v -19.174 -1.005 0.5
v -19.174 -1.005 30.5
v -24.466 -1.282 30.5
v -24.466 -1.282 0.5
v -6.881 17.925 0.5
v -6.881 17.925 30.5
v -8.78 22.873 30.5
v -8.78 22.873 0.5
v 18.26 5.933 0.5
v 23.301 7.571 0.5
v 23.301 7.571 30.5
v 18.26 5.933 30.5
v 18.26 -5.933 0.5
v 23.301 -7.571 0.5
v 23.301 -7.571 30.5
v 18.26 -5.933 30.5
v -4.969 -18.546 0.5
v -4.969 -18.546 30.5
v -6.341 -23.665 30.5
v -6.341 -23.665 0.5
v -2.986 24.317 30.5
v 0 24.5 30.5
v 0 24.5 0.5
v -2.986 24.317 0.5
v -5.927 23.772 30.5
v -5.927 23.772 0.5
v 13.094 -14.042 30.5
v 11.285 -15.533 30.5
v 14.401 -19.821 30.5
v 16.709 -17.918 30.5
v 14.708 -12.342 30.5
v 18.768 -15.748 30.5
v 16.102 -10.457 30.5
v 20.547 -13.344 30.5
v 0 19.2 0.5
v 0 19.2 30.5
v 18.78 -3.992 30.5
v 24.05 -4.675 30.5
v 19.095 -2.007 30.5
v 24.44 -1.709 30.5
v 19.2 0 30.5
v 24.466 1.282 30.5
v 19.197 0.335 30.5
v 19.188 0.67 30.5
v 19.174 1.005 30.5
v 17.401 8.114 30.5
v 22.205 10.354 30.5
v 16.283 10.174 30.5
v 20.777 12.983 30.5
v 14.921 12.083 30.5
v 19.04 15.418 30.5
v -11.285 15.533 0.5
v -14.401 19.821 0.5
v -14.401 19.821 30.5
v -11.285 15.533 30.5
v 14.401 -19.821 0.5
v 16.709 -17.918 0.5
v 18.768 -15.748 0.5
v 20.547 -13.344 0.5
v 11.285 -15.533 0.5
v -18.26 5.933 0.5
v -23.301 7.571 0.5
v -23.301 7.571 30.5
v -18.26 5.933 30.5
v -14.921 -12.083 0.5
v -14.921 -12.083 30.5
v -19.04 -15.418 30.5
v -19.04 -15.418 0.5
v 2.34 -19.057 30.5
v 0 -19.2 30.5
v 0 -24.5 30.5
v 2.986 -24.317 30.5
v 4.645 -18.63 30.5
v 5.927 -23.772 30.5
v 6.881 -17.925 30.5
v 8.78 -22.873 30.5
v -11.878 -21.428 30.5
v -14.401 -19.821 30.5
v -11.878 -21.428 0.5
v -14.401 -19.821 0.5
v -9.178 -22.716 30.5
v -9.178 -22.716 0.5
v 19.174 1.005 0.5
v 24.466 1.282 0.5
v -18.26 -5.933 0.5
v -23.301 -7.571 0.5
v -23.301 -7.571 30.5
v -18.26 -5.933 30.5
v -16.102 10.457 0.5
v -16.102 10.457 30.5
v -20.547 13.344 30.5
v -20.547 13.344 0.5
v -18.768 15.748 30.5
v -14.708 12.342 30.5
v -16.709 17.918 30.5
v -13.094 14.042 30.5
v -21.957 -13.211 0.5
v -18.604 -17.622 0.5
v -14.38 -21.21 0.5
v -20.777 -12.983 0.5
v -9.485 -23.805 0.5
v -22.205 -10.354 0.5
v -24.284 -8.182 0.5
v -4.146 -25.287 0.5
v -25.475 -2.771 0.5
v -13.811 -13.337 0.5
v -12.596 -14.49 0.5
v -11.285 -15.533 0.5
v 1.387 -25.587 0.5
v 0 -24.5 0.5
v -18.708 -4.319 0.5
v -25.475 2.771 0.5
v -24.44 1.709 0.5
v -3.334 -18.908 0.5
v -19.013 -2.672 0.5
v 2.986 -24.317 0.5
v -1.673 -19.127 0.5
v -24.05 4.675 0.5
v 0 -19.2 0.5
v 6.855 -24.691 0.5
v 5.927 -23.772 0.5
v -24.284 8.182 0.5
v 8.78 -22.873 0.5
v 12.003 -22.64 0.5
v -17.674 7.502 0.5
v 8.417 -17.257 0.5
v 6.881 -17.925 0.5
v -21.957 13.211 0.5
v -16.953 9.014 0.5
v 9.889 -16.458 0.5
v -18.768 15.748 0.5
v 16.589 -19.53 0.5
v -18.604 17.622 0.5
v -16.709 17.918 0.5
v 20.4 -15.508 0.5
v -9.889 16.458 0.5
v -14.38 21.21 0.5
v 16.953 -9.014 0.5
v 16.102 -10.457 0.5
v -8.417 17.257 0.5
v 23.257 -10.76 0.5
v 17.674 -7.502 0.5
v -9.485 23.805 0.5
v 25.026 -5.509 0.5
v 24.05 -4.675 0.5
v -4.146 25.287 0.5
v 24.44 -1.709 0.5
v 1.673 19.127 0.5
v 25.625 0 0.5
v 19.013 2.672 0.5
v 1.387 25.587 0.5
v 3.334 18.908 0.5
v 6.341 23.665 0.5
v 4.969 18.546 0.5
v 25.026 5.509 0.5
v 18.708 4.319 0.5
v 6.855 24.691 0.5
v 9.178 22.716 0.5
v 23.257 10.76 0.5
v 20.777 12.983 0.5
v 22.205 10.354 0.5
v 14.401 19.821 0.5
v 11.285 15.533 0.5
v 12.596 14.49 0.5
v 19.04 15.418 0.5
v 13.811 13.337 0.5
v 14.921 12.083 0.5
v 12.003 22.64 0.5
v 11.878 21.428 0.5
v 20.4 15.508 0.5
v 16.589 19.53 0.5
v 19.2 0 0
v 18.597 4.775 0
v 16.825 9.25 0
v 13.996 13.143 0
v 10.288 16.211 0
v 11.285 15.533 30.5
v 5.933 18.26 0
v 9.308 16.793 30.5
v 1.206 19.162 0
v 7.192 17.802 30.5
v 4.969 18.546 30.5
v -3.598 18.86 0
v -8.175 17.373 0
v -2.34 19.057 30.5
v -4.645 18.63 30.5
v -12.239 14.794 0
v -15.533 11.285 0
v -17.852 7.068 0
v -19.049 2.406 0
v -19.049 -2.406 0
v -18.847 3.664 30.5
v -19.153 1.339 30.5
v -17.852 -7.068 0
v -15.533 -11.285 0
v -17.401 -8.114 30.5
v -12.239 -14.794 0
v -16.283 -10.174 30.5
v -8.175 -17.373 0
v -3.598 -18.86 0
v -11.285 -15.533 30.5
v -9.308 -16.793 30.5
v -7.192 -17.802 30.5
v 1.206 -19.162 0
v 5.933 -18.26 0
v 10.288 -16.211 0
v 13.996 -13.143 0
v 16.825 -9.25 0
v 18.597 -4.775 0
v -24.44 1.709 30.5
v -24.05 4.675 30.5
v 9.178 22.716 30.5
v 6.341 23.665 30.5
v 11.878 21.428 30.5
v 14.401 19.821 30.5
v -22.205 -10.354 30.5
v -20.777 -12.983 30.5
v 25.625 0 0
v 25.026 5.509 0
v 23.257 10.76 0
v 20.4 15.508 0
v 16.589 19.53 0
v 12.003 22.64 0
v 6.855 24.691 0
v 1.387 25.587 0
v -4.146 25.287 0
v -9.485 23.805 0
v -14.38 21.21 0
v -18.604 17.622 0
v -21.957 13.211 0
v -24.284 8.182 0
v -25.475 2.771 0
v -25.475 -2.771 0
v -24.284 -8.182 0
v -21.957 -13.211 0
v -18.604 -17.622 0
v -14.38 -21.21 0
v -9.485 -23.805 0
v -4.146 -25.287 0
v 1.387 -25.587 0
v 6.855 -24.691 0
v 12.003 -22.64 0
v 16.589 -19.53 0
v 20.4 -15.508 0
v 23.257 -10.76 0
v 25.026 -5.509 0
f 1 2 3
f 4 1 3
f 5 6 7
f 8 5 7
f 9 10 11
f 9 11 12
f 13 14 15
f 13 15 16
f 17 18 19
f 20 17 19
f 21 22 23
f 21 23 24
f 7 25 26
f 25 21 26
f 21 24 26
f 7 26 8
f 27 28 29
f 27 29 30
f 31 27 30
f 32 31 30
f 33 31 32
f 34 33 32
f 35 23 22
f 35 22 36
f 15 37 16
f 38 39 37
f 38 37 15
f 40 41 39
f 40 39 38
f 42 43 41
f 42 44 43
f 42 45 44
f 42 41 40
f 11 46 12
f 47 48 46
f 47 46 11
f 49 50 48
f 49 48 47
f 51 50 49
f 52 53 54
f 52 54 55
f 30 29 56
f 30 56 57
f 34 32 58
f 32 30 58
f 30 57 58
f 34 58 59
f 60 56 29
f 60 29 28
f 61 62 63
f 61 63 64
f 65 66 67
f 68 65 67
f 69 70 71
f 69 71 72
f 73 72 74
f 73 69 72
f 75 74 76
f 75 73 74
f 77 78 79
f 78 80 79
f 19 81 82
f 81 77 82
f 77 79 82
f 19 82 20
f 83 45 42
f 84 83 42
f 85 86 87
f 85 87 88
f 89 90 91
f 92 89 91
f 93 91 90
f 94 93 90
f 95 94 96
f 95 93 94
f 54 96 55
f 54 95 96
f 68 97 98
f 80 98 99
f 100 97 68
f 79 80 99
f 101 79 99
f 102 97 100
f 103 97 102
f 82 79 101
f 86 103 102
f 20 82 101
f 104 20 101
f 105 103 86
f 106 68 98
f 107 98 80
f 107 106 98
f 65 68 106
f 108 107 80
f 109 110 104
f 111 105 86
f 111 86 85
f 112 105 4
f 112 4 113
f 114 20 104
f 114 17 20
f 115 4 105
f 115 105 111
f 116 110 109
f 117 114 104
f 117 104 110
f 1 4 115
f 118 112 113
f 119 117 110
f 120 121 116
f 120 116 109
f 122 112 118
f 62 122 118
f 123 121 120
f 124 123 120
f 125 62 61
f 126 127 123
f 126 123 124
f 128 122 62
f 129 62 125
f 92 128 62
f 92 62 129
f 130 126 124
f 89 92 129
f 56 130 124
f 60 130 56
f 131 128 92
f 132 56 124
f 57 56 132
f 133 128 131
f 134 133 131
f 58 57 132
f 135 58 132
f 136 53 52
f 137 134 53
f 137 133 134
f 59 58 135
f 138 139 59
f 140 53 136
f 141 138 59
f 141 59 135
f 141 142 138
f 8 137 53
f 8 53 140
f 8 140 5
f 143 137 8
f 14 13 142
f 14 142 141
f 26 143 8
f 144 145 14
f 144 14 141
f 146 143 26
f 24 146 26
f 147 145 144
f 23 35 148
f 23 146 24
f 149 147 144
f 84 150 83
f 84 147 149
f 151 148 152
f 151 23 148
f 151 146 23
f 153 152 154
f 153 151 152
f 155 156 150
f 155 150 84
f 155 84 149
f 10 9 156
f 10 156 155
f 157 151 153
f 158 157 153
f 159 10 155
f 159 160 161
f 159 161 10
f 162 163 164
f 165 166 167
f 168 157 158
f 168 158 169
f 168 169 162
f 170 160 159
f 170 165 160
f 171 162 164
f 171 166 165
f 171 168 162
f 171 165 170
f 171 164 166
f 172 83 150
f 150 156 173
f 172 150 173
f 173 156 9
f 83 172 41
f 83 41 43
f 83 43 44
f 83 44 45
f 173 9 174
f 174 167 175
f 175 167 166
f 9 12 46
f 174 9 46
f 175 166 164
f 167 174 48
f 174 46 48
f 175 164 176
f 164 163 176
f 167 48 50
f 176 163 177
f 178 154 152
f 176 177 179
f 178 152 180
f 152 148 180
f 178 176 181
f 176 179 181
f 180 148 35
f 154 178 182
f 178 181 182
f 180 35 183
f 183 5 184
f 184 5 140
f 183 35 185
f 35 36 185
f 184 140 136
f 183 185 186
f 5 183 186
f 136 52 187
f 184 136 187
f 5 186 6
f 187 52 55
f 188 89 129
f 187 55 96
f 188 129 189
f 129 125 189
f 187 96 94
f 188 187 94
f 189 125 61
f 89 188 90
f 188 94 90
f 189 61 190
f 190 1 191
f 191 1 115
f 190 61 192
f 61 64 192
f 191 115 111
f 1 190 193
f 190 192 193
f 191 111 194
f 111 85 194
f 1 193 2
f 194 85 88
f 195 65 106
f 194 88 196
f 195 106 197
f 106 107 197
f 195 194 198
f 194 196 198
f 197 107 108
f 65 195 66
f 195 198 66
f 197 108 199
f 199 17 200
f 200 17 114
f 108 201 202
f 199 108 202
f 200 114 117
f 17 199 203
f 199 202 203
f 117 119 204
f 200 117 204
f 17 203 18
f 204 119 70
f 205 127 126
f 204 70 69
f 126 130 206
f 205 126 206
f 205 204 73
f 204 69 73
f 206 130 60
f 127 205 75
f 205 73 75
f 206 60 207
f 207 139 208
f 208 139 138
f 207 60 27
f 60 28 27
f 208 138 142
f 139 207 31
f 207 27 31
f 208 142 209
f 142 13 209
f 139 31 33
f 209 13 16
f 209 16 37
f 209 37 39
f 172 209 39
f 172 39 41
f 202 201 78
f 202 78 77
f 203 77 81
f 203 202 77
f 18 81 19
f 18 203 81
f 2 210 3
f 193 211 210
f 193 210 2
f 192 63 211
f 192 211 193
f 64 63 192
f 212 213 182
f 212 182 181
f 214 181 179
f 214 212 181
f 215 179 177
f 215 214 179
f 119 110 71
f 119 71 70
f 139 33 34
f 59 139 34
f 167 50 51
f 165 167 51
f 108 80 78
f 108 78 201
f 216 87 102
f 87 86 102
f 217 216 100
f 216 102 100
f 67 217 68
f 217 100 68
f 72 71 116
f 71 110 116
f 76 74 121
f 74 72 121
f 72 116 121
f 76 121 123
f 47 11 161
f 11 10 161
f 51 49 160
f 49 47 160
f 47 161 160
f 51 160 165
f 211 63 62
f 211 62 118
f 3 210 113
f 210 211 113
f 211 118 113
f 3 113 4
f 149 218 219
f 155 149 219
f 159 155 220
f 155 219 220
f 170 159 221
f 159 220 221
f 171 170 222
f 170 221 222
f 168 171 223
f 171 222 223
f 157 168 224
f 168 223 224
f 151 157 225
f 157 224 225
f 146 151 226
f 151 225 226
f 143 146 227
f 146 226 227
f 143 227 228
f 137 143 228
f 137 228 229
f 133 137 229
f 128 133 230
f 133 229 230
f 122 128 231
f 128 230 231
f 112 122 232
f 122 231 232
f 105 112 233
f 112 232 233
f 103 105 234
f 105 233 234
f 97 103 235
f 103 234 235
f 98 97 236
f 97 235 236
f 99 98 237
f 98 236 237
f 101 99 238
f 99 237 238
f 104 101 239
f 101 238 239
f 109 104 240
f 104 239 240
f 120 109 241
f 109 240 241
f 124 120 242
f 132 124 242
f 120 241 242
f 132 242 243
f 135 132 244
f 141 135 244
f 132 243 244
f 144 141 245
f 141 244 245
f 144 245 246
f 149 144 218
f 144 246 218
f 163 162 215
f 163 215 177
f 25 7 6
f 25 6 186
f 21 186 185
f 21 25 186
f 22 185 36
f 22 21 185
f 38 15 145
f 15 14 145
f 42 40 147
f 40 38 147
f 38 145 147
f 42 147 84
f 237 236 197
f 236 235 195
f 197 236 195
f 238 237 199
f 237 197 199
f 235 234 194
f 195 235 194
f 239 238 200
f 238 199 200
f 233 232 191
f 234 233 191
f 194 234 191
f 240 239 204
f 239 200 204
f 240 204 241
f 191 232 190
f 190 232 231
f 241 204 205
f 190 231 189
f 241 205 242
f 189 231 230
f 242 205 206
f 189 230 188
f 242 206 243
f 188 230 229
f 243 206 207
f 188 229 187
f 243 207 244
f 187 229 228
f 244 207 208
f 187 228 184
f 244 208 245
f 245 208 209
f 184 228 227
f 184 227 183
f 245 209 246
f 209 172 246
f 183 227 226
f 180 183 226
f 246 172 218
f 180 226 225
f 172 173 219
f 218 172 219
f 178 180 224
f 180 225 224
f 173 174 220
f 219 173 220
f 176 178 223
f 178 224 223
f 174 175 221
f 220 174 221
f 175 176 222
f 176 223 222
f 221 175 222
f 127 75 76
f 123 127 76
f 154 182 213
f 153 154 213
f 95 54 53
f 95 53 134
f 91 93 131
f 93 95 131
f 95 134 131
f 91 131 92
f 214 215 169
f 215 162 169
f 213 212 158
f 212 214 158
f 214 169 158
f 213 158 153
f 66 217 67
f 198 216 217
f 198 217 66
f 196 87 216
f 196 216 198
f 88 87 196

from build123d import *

# Parameters (mm, degrees)
F0_R            = 25.625
F1_DEPTH        = 0.5
F2_R            = 24.5
F3_DEPTH        = 30
F4_R            = 19.2
F5_DEPTH        = 30.501
F7_DEPTH        = 30
F7_COPIES_COUNT = 10


# Not quite as in the source:
# - a pattern or mirror of a feature is missing from the dataset's text; its kind, count and spacing are read off the source's solid


with BuildPart() as f1:
    # F0 (on Top) → F1 (new body)
    with BuildSketch(Plane.XY):
        Circle(F0_R)
    extrude(amount=F1_DEPTH)

    # F2 (on face) → F3 (join)
    with BuildSketch(Plane.XY.offset(0.5)):
        Circle(F2_R)
    extrude(amount=F3_DEPTH)

    # F4 (on face) → F5 (cut, through all)
    with BuildSketch(Plane.XY.offset(30.5)):
        Circle(F4_R)
    extrude(amount=-F5_DEPTH, mode=Mode.SUBTRACT)

    # F6 (on face) → F7 (cut, through all)
    with BuildSketch(Plane.XY.offset(30.5)):
        with BuildLine():
            Line((4.969325666, 18.5457758648), (6.341066605, 23.6651827441))
            ThreePointArc((6.341066605, 23.6651827441), (3.1978917094, 24.2903991037), (0, 24.5))
            Line((0, 24.5), (0, 19.2))
            ThreePointArc((0, 19.2), (2.5061028906, 19.0357413384), (4.969325666, 18.5457758648))
        make_face()
    f7 = extrude(amount=-F7_DEPTH, mode=Mode.SUBTRACT)

    # F7_copies: F7 ×10 about axis
    f7_copies_axis = Axis((0, 0, 0), (0, 0, 1))
    for i in range(1, F7_COPIES_COUNT):
        add(f7.rotate(f7_copies_axis, i * 360 / F7_COPIES_COUNT), mode=Mode.SUBTRACT)


solid = f1.part
